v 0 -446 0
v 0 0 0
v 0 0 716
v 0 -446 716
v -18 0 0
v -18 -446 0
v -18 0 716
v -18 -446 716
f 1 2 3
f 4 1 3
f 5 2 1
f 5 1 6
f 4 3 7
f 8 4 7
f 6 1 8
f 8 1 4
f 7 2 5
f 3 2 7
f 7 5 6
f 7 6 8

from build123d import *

# Parameters (mm, degrees)
F0_W     = 47.0984280109
F0_H     = 38.5305583477
F1_DEPTH = 18
F2_DEPTH = 446
F3_DEPTH = 716


with BuildPart() as f1:
    # F0 (on Right) → F1 (new body)
    with BuildSketch(Plane.YZ):
        with Locations((-23.5492140055, 19.2652791739)):
            Rectangle(F0_W, F0_H)
    extrude(amount=-F1_DEPTH)

    # F2 (add): a face of the model
    f2_faces = [f1.faces().sort_by_distance(p)[0] for p in [
        (-9, 0, 19.2652791739),
    ]]
    extrude(f2_faces, amount=-F2_DEPTH)

    # F3 (add): a face of the model
    f3_faces = [f1.faces().sort_by_distance(p)[0] for p in [
        (-9, -223, 0),
    ]]
    extrude(f3_faces, amount=-F3_DEPTH)


solid = f1.part
